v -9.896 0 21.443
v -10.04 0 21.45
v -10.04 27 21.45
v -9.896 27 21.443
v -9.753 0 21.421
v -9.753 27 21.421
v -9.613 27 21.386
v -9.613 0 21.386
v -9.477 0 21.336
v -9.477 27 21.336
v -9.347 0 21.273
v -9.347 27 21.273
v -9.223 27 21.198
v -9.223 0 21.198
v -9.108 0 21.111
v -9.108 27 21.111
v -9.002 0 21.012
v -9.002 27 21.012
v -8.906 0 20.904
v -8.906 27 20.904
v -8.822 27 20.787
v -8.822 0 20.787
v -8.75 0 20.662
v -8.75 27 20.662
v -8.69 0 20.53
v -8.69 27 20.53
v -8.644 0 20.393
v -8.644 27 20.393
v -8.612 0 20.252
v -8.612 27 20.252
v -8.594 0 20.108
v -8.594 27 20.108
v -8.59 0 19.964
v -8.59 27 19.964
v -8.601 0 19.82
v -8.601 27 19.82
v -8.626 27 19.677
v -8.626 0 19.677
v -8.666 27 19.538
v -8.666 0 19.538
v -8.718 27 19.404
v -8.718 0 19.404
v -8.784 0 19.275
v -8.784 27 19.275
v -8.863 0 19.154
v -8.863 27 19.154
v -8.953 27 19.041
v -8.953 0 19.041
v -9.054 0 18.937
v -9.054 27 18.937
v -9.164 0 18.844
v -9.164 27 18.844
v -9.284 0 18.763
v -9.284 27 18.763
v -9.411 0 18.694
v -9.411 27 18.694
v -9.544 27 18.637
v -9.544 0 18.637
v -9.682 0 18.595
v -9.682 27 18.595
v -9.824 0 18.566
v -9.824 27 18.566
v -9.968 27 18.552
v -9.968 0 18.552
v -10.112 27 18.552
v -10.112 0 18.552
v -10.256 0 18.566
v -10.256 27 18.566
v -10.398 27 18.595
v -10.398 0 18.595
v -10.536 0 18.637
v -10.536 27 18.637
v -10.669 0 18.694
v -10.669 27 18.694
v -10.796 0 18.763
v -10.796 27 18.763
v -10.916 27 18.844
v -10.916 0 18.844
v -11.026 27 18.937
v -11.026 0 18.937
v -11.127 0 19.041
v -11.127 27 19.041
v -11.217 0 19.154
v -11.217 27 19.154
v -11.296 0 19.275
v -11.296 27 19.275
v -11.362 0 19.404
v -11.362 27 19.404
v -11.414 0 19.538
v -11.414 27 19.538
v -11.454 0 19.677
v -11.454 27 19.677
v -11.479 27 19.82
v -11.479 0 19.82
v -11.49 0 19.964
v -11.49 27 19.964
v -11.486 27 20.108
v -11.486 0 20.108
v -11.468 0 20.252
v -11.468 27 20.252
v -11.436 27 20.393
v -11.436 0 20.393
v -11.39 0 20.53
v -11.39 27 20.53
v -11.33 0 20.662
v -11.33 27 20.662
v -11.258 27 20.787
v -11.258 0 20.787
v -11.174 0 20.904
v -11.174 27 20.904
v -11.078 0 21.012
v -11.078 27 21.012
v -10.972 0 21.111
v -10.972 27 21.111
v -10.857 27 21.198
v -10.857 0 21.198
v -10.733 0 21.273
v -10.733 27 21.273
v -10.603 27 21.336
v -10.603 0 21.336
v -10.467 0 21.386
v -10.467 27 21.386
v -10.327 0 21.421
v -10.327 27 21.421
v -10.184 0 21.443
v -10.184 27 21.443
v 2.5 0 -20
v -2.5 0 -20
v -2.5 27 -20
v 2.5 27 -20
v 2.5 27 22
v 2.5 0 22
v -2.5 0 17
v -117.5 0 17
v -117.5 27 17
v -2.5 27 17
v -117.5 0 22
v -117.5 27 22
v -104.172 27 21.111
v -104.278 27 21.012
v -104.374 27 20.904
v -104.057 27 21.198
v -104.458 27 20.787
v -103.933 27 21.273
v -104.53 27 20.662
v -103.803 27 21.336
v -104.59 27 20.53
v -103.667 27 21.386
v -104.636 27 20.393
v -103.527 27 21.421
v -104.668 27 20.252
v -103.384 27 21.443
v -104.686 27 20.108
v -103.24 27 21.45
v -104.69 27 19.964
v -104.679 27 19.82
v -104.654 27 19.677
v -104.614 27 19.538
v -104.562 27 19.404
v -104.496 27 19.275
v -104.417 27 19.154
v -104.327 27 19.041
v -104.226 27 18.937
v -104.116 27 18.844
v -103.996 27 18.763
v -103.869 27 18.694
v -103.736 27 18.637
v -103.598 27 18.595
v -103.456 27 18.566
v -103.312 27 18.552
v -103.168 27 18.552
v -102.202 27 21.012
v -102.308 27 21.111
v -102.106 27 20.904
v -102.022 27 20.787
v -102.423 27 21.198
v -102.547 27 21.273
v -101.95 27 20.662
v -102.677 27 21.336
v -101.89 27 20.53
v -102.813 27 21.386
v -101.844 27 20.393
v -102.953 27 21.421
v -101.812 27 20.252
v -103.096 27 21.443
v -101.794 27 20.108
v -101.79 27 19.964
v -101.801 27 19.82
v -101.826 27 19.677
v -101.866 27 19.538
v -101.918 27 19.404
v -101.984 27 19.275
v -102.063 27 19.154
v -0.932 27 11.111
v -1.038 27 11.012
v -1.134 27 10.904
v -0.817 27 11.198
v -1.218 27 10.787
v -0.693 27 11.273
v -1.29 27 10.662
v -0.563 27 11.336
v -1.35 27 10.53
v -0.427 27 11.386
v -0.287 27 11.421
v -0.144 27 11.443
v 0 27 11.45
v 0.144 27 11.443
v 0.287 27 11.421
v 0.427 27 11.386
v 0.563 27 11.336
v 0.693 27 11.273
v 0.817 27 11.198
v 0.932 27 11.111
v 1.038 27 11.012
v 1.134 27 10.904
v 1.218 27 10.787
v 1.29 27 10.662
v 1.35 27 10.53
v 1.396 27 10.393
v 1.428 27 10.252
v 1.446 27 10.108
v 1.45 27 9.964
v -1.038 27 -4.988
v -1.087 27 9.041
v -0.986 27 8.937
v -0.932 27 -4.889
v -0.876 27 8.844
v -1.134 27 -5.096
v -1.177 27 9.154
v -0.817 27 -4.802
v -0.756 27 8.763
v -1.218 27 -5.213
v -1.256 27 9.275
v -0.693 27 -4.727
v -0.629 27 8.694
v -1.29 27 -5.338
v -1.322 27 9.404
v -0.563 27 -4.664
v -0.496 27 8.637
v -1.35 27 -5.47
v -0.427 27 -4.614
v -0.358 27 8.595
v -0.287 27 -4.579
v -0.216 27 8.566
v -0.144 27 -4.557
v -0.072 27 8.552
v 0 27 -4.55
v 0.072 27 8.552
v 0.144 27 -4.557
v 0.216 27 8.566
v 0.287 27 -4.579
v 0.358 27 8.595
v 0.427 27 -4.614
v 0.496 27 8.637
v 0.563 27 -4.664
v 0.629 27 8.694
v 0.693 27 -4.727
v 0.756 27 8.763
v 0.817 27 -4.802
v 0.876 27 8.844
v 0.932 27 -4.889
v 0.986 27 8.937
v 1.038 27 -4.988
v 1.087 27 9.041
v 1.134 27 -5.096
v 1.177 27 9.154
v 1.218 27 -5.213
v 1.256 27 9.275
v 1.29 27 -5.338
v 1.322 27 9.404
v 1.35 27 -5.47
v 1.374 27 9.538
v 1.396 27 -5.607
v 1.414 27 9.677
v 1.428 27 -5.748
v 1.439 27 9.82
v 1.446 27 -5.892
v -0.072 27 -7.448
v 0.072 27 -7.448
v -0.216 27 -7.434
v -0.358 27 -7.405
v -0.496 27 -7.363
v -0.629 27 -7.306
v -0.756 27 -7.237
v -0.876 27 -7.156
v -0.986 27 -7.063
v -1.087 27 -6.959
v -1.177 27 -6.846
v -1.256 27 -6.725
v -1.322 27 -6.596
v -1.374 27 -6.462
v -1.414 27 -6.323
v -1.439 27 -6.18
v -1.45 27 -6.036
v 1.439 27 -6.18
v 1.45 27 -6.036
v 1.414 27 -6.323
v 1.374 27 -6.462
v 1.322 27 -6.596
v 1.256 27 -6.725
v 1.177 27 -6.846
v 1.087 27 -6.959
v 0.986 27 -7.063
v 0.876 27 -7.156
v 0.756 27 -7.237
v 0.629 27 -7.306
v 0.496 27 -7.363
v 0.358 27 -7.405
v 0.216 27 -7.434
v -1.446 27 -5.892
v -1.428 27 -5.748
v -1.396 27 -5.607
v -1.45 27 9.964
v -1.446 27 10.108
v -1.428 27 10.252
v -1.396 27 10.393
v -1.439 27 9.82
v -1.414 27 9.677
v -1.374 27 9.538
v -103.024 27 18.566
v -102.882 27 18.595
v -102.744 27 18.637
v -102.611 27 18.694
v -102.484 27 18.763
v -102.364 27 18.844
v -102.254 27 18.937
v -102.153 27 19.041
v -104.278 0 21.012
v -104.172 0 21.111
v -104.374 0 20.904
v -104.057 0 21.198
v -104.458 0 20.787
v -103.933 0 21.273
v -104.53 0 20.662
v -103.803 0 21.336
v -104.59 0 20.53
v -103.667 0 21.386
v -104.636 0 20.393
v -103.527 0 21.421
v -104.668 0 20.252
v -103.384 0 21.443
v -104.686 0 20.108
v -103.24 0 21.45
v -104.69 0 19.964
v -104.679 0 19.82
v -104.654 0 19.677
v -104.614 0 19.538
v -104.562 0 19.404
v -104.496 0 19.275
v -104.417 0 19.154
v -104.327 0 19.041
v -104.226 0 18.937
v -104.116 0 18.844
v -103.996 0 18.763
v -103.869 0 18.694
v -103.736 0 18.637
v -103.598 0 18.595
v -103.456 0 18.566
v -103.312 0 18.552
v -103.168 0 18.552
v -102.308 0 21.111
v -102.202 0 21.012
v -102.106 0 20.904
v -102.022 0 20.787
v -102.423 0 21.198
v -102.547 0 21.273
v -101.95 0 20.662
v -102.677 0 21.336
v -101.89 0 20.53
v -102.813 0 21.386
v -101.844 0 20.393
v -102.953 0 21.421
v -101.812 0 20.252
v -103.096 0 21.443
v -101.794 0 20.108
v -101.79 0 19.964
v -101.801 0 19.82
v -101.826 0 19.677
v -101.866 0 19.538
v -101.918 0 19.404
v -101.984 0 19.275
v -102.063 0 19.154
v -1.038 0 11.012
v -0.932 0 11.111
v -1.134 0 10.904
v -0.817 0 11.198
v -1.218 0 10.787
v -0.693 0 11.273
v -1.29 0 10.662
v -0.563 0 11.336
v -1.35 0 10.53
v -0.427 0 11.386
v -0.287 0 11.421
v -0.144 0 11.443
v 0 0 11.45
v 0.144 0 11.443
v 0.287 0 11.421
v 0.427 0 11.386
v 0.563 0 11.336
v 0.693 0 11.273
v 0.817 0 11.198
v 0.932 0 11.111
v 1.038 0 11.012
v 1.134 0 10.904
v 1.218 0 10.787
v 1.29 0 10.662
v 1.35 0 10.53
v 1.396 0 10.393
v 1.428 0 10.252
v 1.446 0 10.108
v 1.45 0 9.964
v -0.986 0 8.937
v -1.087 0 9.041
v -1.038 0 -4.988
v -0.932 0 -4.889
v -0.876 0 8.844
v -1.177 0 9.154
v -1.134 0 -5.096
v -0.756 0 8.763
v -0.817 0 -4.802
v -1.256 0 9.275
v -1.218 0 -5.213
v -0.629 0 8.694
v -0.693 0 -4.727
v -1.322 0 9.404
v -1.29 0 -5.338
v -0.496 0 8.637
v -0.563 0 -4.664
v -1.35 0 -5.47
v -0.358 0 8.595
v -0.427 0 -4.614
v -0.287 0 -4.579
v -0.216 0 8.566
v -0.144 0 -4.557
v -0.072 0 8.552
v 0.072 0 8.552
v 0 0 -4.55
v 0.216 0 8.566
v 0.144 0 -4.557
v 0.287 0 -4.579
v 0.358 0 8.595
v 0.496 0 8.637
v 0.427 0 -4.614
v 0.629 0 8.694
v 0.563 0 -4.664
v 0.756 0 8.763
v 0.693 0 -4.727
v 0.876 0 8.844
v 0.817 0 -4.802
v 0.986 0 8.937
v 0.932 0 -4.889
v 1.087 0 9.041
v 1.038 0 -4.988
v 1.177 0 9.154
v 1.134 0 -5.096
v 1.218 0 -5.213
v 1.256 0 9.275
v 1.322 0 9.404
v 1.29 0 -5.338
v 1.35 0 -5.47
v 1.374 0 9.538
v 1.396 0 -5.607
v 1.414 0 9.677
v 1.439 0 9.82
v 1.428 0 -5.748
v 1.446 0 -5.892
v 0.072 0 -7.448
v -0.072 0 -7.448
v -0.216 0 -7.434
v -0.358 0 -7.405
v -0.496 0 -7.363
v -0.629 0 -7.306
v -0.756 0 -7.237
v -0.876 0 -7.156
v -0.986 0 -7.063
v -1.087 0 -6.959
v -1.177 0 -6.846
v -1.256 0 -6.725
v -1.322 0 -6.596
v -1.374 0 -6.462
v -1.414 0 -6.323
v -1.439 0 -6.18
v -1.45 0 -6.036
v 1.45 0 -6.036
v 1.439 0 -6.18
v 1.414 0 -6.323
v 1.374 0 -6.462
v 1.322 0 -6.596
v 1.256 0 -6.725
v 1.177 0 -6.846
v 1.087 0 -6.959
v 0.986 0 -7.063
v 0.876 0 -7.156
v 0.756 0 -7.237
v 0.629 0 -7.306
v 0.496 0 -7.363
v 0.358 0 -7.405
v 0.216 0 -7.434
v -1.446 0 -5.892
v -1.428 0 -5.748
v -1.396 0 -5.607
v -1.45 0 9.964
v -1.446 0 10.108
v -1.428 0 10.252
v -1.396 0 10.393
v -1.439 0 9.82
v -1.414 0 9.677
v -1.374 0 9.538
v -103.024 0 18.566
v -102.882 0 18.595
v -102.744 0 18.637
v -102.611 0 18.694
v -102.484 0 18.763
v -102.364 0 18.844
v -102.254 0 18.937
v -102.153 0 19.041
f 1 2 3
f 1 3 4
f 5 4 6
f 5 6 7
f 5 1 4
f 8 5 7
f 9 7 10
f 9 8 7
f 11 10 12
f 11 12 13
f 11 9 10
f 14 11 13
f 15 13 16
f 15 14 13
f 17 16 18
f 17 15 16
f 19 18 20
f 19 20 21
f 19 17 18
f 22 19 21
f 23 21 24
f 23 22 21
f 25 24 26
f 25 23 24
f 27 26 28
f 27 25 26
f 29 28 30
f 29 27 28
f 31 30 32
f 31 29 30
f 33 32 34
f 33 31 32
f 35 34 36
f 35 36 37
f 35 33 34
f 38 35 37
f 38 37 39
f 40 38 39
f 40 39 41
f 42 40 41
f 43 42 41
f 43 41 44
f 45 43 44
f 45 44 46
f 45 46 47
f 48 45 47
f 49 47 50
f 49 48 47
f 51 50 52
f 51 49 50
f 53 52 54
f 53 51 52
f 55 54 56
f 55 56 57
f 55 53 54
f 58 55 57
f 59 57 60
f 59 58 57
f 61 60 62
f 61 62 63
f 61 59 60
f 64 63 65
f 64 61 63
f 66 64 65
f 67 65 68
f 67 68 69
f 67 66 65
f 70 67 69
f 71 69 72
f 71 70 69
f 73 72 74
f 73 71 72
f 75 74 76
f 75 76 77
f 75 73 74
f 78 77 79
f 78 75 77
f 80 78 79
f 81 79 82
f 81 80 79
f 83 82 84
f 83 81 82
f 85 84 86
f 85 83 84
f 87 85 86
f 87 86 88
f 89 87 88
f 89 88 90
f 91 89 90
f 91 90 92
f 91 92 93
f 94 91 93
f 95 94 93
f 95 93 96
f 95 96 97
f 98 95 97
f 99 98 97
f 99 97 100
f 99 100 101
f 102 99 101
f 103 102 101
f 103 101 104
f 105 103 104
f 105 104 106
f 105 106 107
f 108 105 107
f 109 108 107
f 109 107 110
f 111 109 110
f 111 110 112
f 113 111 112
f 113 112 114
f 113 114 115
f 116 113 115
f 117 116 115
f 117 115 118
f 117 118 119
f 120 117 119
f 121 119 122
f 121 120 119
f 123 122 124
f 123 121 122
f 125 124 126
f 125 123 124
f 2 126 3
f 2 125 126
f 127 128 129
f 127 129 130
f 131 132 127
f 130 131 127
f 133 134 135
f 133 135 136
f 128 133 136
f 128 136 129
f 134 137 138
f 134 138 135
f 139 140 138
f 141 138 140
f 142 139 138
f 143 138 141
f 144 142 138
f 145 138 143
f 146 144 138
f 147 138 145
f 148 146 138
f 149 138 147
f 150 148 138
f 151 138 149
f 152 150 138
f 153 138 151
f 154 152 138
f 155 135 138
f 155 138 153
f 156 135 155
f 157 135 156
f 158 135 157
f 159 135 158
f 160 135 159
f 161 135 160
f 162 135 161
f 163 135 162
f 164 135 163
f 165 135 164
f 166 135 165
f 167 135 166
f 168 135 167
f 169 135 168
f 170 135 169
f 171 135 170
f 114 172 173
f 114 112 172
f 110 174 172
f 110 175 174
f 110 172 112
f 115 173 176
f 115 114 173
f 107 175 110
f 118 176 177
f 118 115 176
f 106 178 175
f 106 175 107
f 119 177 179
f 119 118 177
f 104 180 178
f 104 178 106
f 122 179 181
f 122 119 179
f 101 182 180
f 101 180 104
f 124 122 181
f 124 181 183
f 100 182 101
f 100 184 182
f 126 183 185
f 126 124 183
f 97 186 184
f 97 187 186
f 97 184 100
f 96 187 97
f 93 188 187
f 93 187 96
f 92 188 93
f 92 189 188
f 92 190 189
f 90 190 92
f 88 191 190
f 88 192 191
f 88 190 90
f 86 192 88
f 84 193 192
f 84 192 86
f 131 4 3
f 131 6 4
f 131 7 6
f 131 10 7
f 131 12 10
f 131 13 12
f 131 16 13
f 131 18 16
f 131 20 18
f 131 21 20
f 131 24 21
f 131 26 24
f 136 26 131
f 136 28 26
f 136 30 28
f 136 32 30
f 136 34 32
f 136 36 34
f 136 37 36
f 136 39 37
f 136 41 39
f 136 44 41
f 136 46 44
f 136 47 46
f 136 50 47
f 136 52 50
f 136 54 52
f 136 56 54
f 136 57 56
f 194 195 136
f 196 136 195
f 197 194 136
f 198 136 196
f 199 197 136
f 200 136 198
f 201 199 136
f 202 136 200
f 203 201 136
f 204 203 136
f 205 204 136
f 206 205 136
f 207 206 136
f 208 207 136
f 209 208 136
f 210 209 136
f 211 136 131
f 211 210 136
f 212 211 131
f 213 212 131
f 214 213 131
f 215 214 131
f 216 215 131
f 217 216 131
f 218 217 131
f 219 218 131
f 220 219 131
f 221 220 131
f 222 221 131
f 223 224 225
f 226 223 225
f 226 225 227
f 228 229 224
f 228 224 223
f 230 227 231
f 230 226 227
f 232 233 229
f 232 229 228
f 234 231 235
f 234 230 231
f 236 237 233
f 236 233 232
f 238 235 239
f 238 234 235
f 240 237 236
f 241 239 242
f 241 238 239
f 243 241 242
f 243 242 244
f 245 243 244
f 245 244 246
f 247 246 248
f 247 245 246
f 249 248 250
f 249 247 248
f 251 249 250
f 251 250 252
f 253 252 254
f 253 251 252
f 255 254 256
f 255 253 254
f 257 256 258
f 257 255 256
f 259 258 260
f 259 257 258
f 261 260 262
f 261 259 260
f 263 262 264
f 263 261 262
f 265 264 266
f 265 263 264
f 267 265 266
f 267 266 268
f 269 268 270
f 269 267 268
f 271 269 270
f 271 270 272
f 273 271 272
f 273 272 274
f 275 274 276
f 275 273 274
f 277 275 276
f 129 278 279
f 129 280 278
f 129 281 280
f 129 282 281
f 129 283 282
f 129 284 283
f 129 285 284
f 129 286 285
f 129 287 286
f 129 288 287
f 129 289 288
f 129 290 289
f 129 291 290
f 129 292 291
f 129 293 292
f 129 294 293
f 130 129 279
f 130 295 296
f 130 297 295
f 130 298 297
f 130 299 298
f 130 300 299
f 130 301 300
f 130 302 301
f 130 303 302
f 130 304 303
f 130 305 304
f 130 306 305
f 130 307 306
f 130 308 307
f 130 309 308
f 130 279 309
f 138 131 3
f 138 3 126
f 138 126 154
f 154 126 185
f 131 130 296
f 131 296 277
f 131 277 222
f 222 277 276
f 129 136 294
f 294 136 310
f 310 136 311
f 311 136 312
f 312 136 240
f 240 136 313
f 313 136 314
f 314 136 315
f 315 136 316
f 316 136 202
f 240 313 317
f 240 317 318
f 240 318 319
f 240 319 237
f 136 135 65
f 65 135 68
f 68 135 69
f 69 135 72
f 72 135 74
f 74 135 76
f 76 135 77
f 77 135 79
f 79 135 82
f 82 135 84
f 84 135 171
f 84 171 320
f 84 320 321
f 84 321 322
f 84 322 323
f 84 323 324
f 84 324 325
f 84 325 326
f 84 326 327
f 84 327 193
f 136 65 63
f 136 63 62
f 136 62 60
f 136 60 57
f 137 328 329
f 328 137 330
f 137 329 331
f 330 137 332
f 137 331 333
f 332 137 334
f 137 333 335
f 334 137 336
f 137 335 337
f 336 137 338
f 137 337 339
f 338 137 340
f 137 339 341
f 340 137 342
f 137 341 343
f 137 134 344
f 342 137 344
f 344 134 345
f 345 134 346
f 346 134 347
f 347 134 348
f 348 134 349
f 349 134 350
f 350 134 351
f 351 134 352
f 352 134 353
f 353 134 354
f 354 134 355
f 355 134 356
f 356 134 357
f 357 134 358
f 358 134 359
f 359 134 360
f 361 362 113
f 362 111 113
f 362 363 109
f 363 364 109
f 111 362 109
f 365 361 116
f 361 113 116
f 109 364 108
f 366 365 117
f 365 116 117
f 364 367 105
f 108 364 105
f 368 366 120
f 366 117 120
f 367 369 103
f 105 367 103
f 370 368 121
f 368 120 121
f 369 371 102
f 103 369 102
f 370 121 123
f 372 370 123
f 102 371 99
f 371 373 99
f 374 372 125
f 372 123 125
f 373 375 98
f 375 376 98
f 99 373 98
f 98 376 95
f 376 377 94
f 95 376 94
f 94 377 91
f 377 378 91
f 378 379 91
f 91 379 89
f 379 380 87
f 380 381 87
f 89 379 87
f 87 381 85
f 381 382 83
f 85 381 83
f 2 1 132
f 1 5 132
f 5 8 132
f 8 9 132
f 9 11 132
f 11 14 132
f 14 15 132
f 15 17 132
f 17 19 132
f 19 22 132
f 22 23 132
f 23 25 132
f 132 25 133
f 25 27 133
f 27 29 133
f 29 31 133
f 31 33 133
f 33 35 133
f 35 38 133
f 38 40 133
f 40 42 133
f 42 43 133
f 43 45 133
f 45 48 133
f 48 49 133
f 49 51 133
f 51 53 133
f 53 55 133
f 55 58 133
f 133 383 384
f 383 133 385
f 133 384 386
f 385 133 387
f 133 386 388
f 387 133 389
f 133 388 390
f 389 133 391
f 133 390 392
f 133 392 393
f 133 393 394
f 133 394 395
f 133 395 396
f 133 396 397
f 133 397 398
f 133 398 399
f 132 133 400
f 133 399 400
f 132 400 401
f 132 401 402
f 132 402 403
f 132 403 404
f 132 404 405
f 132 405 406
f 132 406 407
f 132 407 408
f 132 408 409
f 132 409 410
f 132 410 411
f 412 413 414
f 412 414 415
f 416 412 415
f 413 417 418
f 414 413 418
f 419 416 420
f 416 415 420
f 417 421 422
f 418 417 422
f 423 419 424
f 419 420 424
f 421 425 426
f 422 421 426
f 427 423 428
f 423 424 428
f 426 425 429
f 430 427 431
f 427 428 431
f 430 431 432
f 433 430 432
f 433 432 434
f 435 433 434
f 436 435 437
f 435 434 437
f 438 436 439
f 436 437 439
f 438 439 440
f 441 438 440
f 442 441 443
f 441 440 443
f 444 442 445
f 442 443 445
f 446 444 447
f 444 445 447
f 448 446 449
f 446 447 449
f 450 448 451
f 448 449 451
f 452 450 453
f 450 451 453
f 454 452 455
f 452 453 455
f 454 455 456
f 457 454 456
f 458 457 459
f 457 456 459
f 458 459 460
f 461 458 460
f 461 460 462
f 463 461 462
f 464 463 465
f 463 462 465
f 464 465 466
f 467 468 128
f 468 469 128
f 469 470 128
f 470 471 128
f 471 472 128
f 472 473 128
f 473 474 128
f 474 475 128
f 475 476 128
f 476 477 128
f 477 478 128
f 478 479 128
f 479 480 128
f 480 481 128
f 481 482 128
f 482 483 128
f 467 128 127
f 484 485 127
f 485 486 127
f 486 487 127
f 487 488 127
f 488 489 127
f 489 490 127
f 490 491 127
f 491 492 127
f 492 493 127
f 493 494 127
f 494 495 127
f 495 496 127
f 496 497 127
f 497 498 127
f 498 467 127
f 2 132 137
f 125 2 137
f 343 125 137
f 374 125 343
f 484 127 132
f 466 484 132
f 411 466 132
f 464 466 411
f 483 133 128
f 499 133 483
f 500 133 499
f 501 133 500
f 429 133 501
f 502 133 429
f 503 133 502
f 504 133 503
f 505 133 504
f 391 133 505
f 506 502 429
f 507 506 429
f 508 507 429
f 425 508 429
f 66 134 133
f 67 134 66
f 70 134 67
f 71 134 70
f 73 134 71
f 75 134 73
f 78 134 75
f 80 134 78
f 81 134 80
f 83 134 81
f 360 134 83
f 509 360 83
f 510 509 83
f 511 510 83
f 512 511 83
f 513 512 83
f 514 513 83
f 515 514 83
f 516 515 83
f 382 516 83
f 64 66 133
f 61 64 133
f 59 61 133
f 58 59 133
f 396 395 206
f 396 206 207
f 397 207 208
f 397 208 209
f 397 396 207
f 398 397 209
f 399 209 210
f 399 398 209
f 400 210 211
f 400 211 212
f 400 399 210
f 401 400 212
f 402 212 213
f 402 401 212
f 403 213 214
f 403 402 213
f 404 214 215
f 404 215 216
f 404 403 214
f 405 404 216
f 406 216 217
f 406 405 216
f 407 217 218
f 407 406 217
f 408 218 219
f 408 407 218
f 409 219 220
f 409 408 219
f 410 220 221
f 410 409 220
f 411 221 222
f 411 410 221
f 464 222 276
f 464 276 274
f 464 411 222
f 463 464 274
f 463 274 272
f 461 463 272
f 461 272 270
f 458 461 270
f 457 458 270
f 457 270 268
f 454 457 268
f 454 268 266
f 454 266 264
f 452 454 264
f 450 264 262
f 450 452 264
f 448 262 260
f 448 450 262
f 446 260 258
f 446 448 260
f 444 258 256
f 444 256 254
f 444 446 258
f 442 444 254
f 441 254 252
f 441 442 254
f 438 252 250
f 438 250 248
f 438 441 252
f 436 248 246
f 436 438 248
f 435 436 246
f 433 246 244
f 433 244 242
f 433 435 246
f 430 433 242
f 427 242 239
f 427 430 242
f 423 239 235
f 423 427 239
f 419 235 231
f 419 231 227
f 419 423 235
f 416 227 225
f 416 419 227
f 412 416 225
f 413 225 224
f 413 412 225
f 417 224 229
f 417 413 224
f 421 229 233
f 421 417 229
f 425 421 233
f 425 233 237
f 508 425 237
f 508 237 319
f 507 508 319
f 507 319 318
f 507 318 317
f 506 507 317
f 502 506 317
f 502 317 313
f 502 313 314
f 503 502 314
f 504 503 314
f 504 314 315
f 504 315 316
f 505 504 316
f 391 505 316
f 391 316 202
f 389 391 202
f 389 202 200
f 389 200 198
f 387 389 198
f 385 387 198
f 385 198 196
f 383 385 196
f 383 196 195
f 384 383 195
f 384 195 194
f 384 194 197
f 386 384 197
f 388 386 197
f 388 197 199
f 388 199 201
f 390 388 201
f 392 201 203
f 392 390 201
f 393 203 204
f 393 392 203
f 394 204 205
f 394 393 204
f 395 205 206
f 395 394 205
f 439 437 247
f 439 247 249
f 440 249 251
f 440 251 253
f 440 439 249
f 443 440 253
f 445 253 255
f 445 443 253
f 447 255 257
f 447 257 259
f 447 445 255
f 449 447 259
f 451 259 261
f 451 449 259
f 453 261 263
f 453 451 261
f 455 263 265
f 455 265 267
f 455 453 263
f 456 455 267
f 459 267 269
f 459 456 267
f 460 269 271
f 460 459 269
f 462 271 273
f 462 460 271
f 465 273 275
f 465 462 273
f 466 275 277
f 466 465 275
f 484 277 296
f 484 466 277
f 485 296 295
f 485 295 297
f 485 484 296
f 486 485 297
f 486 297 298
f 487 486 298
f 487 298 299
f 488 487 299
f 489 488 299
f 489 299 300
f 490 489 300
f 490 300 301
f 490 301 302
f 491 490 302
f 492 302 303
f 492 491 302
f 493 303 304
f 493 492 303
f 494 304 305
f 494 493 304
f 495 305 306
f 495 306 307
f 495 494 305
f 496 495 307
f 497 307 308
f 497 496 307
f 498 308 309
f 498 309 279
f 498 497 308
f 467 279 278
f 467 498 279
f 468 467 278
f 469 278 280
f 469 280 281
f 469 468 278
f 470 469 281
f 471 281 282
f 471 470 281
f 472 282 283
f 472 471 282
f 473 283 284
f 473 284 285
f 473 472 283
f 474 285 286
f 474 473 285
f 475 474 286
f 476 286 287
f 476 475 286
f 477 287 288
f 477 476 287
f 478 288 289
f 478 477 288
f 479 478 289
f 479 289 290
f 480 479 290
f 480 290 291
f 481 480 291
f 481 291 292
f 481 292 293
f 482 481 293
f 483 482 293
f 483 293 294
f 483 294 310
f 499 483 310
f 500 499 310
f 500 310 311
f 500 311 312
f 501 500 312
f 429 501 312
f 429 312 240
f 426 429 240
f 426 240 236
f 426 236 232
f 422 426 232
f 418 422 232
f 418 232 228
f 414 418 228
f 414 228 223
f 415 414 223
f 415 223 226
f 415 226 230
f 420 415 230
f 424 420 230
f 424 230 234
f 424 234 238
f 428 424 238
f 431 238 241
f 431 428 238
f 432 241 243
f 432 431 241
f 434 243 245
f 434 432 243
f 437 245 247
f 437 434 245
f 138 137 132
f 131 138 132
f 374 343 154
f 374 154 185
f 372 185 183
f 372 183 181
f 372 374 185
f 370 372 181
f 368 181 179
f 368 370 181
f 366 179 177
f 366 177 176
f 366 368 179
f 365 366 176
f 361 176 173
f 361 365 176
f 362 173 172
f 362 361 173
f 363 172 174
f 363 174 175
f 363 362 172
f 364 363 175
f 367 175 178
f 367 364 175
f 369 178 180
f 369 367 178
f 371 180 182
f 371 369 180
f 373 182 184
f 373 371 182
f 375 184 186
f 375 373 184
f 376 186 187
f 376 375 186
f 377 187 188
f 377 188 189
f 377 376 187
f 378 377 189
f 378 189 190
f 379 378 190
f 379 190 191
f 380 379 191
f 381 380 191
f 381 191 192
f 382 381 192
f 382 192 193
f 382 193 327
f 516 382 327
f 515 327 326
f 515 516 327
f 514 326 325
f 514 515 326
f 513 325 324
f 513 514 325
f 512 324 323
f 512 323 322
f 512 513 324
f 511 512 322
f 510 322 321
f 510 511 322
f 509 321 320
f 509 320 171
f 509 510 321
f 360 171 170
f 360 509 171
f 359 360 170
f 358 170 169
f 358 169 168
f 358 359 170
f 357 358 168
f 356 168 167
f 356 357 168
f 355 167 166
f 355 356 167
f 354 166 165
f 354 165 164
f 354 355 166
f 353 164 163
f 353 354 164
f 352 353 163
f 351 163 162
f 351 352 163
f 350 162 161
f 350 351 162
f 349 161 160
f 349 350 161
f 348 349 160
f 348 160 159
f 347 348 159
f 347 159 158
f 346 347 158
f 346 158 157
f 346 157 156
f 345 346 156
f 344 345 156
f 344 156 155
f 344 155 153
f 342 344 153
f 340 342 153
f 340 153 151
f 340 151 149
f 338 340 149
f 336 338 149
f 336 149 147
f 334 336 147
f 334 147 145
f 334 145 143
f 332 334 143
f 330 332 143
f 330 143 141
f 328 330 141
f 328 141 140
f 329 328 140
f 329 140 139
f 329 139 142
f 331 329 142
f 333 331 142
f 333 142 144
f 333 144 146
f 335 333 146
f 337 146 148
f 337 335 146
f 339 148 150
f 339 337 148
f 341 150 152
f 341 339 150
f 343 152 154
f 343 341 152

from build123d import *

# Parameters (mm, degrees)
SKETCH_1_W      = 5
SKETCH_1_H      = 40
SKETCH_1_R      = 1.45
EXTRUDE_1_DEPTH = 27
SKETCH_2_W      = 120
SKETCH_2_H      = 5
SKETCH_2_R      = 1.45
EXTRUDE_2_DEPTH = 27


with BuildPart() as part:
    # 草图1 → 凸台-拉伸1 (new body)
    with BuildSketch(Plane(origin=(0, 0, 0), x_dir=(1, 0, 0), z_dir=(0, 1, 0))):
        Rectangle(SKETCH_1_W, SKETCH_1_H)
        with Locations(Location((0, 6, 0), (0, 0, 270))):
            Circle(SKETCH_1_R, mode=Mode.SUBTRACT)
        with Locations(Location((0, -10, 0), (0, 0, 270))):
            Circle(SKETCH_1_R, mode=Mode.SUBTRACT)
    extrude(amount=EXTRUDE_1_DEPTH)

    # 草图2 → 凸台-拉伸2 (add)
    with BuildSketch(Plane(origin=(0, 0, 0), x_dir=(1, 0, 0), z_dir=(0, 1, 0))):
        with Locations((-57.5, -19.5)):
            Rectangle(SKETCH_2_W, SKETCH_2_H)
        with Locations(Location((-10.04, -20, 0), (0, 0, 270))):
            Circle(SKETCH_2_R, mode=Mode.SUBTRACT)
        with Locations(Location((-103.24, -20, 0), (0, 0, 270))):
            Circle(SKETCH_2_R, mode=Mode.SUBTRACT)
    extrude(amount=EXTRUDE_2_DEPTH)


solid = part.part
